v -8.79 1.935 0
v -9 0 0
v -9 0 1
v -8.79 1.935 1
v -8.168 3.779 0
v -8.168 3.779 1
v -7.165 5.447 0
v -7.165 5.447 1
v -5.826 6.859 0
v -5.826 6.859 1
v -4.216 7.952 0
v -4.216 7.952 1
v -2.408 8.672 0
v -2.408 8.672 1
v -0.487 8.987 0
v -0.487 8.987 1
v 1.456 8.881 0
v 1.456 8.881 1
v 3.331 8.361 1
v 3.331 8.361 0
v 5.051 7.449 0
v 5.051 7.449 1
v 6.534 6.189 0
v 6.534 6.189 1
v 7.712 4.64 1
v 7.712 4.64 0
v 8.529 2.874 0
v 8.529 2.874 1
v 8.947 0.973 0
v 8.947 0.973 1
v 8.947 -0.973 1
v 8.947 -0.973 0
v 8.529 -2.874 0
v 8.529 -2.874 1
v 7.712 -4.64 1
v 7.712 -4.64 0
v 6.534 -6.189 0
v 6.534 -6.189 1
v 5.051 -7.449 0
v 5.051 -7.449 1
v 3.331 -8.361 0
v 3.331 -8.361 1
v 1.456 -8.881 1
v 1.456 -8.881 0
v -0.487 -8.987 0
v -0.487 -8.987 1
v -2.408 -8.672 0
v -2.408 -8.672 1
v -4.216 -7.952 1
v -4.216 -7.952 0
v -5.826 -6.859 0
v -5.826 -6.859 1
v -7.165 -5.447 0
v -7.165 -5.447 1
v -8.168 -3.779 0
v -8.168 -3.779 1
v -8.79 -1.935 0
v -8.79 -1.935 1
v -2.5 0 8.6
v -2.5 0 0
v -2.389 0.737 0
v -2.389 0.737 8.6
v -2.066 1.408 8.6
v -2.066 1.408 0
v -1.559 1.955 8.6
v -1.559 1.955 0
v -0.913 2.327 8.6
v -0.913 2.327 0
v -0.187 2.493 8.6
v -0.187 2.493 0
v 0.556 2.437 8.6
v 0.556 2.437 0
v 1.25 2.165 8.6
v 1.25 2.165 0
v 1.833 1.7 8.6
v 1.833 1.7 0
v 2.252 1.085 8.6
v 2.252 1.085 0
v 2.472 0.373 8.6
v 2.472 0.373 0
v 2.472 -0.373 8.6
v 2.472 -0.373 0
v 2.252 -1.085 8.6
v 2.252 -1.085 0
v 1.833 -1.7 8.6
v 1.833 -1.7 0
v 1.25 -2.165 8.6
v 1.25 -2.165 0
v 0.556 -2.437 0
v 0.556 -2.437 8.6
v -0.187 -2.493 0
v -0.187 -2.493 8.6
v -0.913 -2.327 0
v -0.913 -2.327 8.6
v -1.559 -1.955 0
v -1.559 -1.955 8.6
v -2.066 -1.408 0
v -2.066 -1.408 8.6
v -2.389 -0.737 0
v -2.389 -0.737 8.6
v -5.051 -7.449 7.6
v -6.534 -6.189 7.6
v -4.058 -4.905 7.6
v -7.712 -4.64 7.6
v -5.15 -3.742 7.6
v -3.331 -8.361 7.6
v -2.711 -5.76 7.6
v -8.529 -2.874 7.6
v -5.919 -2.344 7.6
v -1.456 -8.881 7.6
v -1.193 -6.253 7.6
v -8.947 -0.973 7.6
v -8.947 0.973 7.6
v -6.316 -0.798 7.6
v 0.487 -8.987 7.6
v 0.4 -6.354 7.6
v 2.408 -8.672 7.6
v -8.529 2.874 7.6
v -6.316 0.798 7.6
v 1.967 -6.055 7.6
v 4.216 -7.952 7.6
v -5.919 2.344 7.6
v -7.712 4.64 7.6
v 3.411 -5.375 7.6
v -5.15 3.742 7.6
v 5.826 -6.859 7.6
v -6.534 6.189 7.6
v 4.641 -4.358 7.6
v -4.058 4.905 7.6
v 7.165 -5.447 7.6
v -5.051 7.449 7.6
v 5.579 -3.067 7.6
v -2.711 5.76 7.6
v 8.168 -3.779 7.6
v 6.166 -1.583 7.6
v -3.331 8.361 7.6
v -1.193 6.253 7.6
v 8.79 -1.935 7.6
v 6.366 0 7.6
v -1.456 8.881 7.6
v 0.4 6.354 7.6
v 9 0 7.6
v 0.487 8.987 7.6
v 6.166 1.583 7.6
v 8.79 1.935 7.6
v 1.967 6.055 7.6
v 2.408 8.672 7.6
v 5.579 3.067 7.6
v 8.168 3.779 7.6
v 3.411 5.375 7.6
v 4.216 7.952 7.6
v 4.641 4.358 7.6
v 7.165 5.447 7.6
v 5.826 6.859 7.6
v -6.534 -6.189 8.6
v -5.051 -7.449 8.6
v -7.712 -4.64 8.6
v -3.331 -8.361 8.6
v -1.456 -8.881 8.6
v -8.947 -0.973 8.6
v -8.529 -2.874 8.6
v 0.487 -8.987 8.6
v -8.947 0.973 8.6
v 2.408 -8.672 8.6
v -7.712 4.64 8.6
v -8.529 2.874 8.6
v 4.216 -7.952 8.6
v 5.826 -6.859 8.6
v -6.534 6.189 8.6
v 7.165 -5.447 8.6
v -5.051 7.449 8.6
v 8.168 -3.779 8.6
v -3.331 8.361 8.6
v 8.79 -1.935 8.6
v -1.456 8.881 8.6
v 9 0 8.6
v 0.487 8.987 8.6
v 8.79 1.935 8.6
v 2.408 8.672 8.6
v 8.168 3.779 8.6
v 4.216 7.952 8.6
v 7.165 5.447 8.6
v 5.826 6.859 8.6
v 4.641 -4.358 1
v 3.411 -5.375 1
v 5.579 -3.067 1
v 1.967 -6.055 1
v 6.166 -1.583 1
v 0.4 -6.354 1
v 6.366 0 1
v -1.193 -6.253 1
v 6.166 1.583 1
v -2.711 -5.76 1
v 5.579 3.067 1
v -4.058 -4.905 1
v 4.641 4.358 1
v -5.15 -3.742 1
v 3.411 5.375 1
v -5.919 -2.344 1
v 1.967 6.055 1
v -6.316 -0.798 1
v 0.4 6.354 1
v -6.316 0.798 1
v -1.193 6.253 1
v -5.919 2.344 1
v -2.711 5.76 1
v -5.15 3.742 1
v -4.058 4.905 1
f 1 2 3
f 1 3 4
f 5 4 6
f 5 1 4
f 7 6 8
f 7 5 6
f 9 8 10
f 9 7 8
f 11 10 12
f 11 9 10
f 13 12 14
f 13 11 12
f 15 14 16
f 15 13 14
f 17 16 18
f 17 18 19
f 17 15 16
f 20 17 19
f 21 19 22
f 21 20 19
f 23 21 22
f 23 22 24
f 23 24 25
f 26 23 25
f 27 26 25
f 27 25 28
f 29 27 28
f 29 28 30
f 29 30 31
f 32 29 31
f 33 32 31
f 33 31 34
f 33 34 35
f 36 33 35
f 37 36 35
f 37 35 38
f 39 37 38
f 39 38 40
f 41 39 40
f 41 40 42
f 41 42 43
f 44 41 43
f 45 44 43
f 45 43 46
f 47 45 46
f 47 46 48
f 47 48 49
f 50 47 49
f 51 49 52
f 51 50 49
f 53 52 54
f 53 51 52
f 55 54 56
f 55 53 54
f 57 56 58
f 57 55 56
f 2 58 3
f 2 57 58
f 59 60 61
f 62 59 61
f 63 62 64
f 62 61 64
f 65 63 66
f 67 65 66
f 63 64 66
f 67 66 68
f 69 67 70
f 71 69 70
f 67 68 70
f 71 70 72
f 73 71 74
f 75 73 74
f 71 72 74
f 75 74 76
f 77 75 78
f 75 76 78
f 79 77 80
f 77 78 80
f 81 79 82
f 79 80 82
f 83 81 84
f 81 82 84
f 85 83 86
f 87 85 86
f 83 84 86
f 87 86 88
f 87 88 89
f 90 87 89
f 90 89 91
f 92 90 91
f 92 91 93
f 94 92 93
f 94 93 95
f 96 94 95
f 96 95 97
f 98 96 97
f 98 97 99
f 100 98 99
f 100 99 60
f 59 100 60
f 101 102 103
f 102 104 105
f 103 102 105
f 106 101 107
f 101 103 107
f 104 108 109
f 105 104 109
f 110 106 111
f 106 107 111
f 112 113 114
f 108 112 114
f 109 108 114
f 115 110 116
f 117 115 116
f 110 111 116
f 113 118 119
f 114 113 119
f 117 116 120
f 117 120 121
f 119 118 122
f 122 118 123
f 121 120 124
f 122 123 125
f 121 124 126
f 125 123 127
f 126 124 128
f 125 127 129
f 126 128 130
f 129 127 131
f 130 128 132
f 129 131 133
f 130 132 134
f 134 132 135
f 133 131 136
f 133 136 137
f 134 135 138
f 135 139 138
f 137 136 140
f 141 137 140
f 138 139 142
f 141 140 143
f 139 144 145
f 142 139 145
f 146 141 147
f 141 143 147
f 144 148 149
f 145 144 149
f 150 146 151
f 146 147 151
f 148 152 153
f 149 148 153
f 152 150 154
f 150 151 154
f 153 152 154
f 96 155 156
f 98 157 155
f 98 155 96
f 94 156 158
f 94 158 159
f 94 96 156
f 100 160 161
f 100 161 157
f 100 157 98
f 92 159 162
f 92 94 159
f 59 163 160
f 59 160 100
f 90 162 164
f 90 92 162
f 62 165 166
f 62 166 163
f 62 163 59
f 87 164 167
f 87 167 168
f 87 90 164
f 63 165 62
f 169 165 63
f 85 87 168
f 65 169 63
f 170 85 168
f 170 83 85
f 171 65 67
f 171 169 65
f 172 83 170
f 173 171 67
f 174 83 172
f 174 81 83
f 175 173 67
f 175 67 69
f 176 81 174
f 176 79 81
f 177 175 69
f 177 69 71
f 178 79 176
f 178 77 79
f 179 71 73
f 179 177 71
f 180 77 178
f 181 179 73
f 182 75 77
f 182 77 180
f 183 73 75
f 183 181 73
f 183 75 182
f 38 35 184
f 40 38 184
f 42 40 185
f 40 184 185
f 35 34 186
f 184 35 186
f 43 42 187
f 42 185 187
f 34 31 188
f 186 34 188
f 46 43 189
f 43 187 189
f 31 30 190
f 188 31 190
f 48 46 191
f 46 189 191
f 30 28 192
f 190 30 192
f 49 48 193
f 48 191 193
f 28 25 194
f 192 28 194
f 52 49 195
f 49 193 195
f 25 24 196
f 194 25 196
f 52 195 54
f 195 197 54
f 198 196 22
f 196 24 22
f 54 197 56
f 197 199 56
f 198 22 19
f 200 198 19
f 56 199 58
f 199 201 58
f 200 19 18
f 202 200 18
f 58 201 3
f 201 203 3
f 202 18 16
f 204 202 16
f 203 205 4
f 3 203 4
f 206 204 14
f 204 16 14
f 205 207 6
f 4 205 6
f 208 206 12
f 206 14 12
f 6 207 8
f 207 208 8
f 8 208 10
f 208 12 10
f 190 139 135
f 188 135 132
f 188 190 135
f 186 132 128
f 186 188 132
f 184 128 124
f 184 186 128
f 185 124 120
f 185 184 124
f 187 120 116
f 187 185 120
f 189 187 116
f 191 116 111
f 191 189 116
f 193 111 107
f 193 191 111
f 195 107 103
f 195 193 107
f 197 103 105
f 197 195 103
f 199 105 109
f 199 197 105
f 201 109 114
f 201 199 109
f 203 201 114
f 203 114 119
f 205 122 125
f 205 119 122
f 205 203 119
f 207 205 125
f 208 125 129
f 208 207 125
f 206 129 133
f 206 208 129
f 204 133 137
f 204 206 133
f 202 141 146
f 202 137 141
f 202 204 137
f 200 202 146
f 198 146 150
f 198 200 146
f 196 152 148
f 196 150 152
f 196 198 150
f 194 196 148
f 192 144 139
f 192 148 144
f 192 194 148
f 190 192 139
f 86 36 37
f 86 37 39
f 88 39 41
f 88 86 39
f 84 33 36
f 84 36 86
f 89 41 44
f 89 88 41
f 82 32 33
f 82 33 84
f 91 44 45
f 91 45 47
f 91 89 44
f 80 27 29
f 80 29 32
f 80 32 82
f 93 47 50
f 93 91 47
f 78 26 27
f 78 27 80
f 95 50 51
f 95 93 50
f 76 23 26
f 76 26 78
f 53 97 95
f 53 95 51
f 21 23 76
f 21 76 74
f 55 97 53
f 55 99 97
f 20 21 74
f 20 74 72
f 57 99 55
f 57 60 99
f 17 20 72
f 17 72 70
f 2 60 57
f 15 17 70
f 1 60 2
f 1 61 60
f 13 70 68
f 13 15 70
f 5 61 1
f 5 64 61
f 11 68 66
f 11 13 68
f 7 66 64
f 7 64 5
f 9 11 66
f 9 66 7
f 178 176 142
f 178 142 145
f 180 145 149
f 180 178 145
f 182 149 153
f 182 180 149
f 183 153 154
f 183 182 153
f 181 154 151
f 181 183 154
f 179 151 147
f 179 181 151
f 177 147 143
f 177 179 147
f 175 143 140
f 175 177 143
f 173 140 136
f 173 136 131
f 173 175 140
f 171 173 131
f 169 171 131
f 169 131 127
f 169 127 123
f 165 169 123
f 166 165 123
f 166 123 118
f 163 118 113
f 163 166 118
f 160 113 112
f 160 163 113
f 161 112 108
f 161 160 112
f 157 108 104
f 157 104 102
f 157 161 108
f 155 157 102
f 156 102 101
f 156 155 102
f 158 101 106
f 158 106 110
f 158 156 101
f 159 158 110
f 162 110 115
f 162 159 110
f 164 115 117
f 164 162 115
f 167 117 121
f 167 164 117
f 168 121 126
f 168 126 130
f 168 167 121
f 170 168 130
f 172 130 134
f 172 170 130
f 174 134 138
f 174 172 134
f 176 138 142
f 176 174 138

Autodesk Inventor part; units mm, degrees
ref_plane "YZ Plane" through (0, 0, 0) normal (1, 0, 0) x (0, 1, 0)
ref_plane "XZ Plane" through (0, 0, 0) normal (0, 1, 0) x (-1, 0, 0)
ref_plane "XY Plane" through (0, 0, 0) normal (0, 0, 1) x (1, 0, 0)
sketch "Sketch1" plane through (0, 0, 0) normal (0, 0, 1) x (1, 0, 0)
  circle A0 centre (0, 0) radius 6.3662
  dimension "d0" = 12.7324
extrude "Extrusion1" add sketch "Sketch1" along normal blind 8.6
sketch "Sketch2" plane through (0, 0, 8.6) normal (0, 0, 1) x (1, 0, 0)
  circle A0 centre (0, 0) radius 6.3662 projected
  circle A1 centre (0, 0) radius 9
  dimension "d5" = 18
extrude "Extrusion2" add sketch "Sketch2" against normal blind 1
sketch "Sketch3" plane through (0, 0, 0) normal (0, 0, -1) x (-1, 0, 0)
  circle A0 centre (0, 0) radius 6.3662 projected
  circle A1 centre (0, 0) radius 6.3662 projected
  circle A2 centre (0, 0) radius 9 projected
extrude "Extrusion3" add sketch "Sketch3" against normal blind 1
sketch "Sketch4" plane through (0, 0, 0) normal (0, 0, -1) x (-1, 0, 0)
  circle A0 centre (0, 0) radius 9 projected
  circle A1 centre (0, 0) radius 2.5
  dimension "d11" = 5
extrude "Extrusion4" cut sketch "Sketch4" against normal through all contours A1
properties part number "idler"
